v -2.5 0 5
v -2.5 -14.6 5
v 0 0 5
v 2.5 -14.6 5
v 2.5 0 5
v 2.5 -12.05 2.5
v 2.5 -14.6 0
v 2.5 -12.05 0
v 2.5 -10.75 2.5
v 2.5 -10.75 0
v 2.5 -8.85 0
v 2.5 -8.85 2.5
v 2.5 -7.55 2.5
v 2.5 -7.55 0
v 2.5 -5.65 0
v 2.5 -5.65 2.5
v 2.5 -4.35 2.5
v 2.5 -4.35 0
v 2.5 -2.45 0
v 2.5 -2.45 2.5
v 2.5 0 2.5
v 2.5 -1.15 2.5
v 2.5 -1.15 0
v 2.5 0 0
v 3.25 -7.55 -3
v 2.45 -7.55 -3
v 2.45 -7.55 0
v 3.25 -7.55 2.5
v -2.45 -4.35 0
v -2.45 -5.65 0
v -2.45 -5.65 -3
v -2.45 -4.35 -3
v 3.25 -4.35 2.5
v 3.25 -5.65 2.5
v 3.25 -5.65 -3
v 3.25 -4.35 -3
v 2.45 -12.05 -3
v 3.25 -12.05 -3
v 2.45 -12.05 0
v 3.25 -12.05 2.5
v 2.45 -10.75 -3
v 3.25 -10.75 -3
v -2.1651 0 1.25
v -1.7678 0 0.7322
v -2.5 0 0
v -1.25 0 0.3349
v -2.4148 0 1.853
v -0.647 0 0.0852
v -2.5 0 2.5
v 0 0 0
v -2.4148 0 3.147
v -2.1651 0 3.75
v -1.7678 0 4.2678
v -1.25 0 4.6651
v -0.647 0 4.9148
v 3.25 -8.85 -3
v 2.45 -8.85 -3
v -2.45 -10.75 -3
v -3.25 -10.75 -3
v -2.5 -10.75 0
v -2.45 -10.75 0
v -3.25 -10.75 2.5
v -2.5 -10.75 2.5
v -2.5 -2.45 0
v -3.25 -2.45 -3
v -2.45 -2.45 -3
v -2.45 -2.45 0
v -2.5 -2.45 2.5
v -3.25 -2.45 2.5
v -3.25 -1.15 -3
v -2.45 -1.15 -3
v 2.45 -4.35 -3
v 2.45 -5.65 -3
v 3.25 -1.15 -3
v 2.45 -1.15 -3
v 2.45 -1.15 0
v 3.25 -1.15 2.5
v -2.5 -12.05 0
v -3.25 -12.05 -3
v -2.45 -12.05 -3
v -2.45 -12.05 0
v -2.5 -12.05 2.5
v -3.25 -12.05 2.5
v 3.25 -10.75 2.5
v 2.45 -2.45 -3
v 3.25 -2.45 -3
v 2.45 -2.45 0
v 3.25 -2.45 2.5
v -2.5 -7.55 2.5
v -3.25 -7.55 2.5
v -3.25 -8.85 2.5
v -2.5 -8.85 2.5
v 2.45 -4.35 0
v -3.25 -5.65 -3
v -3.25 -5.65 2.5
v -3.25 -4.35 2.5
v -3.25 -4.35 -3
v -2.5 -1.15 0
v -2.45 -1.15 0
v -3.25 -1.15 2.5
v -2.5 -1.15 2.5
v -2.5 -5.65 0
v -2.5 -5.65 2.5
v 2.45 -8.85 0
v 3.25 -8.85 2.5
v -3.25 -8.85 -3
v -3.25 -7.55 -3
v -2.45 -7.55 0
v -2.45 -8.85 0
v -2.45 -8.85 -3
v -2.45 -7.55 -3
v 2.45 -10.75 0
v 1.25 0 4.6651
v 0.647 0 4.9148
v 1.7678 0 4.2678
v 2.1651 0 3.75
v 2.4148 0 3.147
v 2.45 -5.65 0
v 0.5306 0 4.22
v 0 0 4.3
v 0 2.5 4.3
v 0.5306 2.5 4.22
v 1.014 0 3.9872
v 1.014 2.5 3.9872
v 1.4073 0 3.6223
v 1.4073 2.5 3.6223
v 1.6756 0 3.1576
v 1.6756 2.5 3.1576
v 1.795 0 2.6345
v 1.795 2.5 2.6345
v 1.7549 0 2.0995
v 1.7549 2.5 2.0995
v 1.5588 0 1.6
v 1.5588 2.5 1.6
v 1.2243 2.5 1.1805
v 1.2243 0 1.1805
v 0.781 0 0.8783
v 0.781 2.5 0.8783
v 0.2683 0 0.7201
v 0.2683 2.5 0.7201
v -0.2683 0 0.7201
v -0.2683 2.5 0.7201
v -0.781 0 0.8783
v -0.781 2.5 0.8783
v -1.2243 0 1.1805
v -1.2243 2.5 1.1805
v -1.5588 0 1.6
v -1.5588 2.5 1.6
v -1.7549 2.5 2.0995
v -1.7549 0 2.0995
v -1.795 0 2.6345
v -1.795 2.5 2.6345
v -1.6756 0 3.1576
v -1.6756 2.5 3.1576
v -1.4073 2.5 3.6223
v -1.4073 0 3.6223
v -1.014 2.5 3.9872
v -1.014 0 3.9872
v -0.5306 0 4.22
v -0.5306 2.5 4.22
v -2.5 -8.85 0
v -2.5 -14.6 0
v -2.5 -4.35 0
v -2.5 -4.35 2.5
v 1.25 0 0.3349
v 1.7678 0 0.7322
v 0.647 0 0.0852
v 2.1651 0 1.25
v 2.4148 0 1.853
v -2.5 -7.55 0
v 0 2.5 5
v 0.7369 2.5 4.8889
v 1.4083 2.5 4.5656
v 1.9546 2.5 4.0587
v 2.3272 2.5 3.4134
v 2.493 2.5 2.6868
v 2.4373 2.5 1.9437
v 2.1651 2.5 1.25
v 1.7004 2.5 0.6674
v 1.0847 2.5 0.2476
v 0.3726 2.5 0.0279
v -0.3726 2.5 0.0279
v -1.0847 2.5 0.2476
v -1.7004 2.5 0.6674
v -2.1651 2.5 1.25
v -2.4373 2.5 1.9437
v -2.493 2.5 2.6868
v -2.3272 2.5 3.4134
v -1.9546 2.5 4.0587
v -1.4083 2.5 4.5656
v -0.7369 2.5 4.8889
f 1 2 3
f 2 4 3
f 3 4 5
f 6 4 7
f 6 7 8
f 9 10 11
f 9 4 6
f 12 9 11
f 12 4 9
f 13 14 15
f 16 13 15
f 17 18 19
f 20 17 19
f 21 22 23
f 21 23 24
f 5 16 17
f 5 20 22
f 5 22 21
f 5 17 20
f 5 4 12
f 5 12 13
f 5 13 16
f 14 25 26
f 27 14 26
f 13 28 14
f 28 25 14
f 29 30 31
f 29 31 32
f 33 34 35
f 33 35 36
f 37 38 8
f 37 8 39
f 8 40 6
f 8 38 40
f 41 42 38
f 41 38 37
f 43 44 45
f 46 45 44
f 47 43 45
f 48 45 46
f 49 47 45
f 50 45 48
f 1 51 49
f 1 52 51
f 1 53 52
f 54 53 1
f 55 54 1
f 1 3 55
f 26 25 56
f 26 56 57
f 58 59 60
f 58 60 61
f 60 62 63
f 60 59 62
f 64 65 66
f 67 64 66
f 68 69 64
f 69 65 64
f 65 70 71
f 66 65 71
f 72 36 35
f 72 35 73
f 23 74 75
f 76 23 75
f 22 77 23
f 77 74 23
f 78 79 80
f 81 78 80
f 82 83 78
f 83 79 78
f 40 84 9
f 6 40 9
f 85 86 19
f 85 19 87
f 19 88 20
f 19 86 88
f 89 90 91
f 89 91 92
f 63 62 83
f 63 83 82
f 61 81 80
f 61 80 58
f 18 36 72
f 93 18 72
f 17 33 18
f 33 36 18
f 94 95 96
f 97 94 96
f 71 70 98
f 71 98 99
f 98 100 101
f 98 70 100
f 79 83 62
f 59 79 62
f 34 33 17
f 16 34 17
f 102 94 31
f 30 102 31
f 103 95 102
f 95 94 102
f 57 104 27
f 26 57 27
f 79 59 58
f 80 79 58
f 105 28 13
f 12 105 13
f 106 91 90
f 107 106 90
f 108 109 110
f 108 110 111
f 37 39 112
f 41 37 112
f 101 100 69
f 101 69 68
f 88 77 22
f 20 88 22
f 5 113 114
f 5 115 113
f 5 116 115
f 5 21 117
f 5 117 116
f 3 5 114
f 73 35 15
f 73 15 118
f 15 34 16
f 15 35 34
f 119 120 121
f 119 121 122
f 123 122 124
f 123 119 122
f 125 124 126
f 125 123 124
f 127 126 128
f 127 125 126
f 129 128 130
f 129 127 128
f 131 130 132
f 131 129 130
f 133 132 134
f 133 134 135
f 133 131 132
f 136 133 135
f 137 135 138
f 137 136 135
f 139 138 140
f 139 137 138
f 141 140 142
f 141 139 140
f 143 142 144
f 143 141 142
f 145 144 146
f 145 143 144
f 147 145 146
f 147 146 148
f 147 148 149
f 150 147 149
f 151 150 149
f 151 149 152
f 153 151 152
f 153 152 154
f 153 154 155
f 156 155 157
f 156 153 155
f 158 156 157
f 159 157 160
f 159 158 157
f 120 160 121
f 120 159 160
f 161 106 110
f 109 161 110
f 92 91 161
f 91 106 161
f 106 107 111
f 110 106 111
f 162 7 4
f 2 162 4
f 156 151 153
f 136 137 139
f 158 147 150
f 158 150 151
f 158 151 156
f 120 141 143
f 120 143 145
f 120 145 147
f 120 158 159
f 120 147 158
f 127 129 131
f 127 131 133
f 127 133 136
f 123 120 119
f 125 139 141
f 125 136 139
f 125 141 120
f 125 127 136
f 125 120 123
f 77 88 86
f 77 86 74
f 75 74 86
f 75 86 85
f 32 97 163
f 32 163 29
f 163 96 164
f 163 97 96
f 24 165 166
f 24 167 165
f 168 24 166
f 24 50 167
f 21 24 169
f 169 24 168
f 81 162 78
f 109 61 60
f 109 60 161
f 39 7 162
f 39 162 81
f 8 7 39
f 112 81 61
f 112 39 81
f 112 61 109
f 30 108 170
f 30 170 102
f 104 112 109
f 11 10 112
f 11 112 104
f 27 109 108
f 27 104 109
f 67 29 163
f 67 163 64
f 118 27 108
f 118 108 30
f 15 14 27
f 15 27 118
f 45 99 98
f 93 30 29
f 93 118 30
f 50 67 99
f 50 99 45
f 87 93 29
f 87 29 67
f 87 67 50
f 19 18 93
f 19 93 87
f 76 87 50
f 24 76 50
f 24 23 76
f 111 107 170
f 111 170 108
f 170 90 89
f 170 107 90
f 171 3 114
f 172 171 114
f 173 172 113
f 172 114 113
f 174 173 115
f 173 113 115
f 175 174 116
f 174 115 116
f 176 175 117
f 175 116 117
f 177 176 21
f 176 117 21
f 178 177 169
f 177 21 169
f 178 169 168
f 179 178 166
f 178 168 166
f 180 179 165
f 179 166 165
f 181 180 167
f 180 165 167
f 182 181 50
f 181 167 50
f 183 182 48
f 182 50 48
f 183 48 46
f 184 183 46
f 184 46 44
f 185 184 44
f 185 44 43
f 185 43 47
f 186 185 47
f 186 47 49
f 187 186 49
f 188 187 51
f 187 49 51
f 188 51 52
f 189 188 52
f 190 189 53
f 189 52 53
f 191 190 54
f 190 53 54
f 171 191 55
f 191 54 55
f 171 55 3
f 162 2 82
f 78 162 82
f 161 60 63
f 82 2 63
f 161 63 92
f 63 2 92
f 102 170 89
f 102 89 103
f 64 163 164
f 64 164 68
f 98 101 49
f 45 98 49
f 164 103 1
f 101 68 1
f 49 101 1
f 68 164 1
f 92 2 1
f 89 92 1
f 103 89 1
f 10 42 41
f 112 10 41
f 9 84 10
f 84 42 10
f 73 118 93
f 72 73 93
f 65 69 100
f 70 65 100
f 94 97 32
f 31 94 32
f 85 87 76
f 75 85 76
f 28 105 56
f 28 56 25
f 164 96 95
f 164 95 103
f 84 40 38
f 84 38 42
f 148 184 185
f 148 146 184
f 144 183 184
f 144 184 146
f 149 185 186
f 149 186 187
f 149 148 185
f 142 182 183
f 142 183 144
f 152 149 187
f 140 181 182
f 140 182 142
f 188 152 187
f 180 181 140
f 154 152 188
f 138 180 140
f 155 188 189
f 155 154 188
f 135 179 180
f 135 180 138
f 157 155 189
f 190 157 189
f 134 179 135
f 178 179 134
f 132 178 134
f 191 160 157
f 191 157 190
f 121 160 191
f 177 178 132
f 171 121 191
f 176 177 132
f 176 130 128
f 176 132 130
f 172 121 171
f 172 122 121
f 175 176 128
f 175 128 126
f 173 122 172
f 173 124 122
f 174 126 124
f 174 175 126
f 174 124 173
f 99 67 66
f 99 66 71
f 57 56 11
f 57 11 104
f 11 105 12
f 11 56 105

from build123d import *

# Parameters (mm, degrees)
SKETCH_W                = 14.6
SKETCH_H                = 5
PAD_DEPTH               = 2.5
SKETCH001_R             = 2.5
SKETCH001_R_2           = 1.8
PAD001_DEPTH            = 2.5
SKETCH002_W             = 0.8
SKETCH002_H             = 1.3
PAD002_DEPTH            = 5.5
SKETCH002_MIRRORED_2_W  = 0.8
SKETCH002_MIRRORED_2_H  = 1.3
PAD002_MIRRORED_2_DEPTH = 5.5
LINEARPATTERN_COUNT     = 4
LINEARPATTERN_PITCH     = 3.2


with BuildPart() as part:
    # Sketch → Pad (new body, symmetric)
    with BuildSketch(Plane.YZ):
        with Locations((-7.3, 2.5)):
            Rectangle(SKETCH_W, SKETCH_H)
    extrude(amount=PAD_DEPTH, both=True)

    # Sketch001 (on Face2 of Pad) → Pad001 (join)
    with BuildSketch(Plane.ZX):
        with Locations((2.5, 0)):
            Circle(SKETCH001_R)
        with Locations((2.5, 0)):
            Circle(SKETCH001_R_2, mode=Mode.SUBTRACT)
    extrude(amount=PAD001_DEPTH)

    # Sketch002 → Pad002 (join)
    with BuildSketch(Plane.XY.offset(2.5)):
        with Locations((-2.85, -11.4)):
            Rectangle(SKETCH002_W, SKETCH002_H)
    pad002 = extrude(amount=-PAD002_DEPTH)

    # Sketch002 Mirrored 2 → Pad002 Mirrored 2 (add)
    with BuildSketch(Plane(origin=(0, 0, 2.5), x_dir=(-1, 0, 0), z_dir=(0, 0, -1))):
        with Locations((-2.85, -11.4)):
            Rectangle(SKETCH002_MIRRORED_2_W, SKETCH002_MIRRORED_2_H)
    pad002_mirrored_2 = extrude(amount=PAD002_MIRRORED_2_DEPTH)

    # LinearPattern: Pad002, Pad002 Mirrored 2 ×4
    with Locations(*[(0, i * LINEARPATTERN_PITCH, 0) for i in range(1, LINEARPATTERN_COUNT)]):
        add(pad002)
        add(pad002_mirrored_2)


solid = part.part
